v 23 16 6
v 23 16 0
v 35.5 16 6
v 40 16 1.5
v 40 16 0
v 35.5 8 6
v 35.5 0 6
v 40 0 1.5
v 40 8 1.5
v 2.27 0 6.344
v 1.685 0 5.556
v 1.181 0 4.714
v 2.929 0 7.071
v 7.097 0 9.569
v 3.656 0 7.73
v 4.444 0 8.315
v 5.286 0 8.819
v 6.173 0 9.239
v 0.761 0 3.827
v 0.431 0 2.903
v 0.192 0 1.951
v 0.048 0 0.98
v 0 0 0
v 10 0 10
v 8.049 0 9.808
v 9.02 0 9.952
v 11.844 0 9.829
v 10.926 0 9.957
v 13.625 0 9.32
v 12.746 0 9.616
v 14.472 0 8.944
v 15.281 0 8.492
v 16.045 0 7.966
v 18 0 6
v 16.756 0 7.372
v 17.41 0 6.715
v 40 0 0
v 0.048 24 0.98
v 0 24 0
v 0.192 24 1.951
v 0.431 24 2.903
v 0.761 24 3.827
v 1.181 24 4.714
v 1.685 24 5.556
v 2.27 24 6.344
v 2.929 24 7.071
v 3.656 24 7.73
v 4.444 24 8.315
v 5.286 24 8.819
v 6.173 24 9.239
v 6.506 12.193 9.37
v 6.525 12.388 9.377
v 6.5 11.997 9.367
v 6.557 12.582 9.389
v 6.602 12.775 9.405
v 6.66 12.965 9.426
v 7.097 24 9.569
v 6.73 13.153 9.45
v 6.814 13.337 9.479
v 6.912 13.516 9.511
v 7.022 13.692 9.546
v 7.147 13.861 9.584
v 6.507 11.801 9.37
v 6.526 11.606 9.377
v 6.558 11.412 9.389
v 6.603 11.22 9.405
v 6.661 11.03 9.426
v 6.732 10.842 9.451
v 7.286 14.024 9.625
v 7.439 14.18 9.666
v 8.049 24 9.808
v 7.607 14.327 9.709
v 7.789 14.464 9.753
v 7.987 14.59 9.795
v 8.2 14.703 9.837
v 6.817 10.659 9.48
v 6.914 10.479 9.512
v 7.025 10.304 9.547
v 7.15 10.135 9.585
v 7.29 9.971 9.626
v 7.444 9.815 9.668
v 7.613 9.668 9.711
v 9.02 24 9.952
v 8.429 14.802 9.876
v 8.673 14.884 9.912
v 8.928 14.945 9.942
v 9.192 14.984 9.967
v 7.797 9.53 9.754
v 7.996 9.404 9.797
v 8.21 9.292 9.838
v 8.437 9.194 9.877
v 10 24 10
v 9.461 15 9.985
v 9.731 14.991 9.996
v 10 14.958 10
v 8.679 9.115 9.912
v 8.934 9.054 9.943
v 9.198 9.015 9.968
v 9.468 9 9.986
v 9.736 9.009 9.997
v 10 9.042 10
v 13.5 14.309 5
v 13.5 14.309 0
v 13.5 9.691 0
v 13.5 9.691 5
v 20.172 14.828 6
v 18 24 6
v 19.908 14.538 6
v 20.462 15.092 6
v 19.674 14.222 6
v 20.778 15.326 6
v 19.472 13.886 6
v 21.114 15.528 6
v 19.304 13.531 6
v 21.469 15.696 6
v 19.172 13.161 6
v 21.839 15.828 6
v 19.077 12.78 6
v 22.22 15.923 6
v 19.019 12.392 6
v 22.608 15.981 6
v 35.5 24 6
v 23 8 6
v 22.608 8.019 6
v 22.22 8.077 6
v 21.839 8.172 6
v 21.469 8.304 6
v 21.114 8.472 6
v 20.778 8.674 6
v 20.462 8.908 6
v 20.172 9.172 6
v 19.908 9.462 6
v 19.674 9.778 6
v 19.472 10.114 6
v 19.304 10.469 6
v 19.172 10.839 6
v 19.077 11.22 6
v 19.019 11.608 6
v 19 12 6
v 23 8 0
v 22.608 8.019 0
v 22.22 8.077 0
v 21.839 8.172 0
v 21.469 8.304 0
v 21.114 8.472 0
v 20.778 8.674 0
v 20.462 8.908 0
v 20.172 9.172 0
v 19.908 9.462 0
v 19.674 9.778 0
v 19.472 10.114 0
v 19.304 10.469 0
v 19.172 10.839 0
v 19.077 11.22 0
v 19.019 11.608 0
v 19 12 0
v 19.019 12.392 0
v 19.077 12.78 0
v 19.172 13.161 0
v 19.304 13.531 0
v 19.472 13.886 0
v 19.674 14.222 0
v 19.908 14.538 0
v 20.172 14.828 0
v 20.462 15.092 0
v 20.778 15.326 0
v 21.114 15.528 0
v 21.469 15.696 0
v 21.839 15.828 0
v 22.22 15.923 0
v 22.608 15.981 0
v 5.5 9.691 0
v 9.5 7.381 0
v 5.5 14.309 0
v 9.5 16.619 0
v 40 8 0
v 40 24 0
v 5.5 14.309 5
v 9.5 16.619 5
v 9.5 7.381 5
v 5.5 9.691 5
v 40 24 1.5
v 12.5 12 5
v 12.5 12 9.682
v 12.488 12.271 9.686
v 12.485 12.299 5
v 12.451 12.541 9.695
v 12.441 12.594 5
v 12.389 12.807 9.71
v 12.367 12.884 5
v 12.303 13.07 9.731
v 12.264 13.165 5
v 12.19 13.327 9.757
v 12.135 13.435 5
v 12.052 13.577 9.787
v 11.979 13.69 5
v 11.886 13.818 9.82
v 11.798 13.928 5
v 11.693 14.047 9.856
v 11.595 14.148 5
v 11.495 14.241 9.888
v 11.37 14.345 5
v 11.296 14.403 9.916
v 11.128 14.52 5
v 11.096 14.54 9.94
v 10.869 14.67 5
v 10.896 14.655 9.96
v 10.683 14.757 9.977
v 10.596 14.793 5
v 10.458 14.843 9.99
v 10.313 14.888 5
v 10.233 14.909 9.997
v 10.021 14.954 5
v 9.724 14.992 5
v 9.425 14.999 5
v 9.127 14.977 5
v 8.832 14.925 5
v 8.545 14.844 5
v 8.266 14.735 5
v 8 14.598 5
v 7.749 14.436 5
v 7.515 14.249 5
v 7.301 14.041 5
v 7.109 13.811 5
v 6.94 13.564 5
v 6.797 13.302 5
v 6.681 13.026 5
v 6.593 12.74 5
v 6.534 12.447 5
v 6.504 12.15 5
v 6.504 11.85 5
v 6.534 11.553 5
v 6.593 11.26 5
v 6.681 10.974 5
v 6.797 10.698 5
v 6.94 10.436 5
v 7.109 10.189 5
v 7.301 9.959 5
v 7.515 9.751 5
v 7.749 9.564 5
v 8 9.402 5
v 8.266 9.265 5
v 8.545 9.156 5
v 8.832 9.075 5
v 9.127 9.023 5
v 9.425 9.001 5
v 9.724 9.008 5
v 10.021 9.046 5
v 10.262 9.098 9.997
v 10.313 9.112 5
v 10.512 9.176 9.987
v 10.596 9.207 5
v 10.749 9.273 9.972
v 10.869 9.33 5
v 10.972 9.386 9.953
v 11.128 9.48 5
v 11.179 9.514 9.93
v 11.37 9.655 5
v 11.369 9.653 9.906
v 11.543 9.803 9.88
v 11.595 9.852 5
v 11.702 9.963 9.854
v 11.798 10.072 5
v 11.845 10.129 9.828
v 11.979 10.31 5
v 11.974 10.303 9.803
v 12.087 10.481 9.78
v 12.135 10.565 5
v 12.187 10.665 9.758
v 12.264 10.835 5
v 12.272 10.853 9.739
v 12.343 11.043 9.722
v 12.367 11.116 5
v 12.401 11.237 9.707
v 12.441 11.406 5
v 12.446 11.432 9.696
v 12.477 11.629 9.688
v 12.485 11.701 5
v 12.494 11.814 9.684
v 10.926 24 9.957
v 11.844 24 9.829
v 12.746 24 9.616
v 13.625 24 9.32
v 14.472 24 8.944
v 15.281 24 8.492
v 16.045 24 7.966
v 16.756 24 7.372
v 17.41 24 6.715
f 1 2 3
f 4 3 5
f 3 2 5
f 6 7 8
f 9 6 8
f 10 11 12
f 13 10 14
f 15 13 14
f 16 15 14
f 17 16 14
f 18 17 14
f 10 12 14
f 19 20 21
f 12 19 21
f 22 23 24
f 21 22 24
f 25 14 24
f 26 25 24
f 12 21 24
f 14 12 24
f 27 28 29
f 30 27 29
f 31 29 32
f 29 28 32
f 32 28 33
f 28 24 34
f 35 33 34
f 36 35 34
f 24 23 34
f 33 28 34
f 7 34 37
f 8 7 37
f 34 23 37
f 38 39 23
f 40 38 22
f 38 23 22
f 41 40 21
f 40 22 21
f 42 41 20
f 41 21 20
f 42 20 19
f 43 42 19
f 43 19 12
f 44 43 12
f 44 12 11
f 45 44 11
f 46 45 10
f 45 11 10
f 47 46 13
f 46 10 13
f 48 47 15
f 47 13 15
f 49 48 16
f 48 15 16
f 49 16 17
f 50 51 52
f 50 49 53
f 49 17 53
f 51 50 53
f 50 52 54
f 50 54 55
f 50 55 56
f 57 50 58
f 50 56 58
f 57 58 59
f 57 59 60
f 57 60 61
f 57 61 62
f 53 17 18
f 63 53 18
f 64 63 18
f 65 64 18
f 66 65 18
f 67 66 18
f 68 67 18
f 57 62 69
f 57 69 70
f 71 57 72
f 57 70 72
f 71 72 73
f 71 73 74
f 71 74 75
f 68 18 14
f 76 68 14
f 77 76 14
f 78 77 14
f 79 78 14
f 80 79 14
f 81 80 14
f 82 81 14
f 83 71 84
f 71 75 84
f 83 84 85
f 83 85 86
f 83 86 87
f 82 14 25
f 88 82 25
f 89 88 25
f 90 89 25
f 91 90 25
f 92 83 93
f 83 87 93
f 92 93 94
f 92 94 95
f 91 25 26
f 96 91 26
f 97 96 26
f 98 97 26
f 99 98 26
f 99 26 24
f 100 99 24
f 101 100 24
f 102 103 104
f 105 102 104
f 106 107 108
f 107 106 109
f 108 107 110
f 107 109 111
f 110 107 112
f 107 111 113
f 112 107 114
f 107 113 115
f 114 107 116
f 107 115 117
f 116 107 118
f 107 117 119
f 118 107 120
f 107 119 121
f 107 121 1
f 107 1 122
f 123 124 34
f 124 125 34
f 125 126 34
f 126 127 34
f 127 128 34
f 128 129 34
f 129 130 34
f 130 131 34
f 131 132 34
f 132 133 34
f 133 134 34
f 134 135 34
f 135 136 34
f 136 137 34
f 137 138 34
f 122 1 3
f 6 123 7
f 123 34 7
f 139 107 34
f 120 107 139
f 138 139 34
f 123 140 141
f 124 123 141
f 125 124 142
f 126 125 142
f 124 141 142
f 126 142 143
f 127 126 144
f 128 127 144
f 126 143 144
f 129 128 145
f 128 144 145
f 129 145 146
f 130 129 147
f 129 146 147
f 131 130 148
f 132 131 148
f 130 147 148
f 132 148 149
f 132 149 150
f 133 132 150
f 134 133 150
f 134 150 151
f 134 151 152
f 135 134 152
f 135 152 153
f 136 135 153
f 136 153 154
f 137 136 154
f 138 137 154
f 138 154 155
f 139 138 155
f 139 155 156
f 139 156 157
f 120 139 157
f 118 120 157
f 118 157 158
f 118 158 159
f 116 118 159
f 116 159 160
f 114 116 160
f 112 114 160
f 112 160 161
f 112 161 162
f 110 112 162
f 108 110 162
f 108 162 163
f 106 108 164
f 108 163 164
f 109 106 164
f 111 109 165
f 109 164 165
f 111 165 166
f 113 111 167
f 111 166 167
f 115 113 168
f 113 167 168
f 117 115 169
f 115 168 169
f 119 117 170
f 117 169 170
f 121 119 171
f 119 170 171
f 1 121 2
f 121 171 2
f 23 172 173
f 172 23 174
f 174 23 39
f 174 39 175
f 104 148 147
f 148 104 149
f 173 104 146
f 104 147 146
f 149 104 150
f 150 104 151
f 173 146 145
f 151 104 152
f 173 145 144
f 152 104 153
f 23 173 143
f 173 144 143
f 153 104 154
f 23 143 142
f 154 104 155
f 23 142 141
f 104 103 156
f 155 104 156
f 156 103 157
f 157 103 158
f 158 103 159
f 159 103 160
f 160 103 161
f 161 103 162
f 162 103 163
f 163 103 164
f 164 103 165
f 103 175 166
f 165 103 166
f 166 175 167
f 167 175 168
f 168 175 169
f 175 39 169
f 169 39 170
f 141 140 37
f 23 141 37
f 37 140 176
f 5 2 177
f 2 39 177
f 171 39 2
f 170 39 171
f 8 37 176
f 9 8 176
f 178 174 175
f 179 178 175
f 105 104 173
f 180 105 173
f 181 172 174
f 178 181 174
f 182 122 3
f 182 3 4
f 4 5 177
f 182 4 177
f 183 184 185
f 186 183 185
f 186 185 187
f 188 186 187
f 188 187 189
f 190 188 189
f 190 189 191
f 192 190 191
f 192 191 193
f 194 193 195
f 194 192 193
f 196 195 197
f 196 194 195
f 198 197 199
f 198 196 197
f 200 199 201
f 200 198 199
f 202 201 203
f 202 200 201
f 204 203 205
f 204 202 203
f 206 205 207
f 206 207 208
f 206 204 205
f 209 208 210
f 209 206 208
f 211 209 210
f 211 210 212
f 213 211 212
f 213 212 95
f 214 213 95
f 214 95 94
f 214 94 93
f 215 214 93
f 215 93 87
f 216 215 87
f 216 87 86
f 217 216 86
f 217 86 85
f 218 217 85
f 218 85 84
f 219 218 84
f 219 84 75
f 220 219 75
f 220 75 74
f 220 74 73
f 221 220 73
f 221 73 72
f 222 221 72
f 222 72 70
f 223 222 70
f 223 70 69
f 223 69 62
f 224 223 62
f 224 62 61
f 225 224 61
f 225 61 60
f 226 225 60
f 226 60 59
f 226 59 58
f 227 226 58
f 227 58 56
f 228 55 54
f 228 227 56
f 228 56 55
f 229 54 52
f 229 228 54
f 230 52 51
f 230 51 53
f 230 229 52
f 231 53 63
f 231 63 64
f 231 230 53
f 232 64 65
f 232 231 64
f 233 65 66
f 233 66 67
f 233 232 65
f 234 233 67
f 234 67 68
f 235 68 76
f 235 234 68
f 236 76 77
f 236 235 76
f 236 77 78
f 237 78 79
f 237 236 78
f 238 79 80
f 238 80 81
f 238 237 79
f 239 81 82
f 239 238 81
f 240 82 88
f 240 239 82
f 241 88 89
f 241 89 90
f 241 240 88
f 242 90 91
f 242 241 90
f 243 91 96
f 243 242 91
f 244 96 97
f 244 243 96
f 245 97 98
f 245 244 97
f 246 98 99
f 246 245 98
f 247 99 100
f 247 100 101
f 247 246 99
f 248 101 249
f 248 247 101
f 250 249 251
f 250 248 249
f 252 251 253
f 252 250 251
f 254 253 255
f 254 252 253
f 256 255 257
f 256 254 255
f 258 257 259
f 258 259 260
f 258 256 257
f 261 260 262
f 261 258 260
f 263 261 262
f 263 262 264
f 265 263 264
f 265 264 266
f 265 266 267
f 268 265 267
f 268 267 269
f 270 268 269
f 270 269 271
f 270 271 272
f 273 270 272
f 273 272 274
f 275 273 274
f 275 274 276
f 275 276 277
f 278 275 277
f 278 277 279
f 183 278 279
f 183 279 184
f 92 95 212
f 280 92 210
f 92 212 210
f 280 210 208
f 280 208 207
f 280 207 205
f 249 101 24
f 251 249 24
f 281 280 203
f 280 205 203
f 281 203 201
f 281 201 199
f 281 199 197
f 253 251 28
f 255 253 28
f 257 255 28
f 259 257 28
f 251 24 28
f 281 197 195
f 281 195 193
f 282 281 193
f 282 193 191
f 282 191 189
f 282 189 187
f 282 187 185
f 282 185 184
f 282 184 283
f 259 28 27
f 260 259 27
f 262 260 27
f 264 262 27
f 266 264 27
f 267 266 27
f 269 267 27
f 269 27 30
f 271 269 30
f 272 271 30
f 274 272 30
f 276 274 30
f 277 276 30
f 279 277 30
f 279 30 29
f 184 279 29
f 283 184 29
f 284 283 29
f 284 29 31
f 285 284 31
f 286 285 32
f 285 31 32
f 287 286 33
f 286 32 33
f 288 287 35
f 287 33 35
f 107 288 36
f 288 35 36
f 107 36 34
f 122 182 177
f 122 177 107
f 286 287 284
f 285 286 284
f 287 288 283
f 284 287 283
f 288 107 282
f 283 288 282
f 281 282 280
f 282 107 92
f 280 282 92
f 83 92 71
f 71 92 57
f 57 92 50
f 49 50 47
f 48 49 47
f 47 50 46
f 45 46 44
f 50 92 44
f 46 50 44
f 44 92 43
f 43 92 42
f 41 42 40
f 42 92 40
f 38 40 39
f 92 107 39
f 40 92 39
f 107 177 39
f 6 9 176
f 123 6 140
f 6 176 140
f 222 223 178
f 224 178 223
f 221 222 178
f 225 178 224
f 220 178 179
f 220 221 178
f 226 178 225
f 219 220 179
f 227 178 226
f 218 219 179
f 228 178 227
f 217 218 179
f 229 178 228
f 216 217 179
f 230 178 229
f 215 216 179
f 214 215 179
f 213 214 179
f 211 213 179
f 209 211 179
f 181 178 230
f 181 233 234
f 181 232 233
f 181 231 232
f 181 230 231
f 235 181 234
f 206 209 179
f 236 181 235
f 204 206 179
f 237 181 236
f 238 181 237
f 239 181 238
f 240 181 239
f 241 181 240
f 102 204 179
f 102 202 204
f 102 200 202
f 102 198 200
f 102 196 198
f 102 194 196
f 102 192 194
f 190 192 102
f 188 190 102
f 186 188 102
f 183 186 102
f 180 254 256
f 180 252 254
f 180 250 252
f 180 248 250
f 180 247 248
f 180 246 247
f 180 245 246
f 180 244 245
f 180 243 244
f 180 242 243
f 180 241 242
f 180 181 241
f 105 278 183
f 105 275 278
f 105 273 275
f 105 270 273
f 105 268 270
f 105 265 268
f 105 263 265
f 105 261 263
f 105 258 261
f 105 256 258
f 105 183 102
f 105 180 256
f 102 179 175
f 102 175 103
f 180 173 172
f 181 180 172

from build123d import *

# Parameters (mm, degrees)
F0_R     = 3
F1_DEPTH = 10
F2_R     = 3
F3_DEPTH = 5
F5_DEPTH = 24.001


with BuildPart() as f1:
    # F0 (on Top) → F1 (new body)
    with BuildSketch(Plane.XY):
        with BuildLine():
            Line((0, 24), (0, 0))
            Line((0, 0), (40, 0))
            Line((40, 0), (40, 8))
            Line((40, 8), (23, 8))
            ThreePointArc((23, 8), (19, 12), (23, 16))
            Line((23, 16), (40, 16))
            Line((40, 16), (40, 24))
            Line((40, 24), (0, 24))
        make_face()
        with Locations((9.5, 12)):
            Circle(F0_R, mode=Mode.SUBTRACT)
    extrude(amount=F1_DEPTH)

    # F2 (on face) → F3 (cut)
    with BuildSketch(Plane(origin=(0, 0, 0), x_dir=(1, 0, 0), z_dir=(0, 0, -1))):
        Polygon((9.5, -16.618802), (13.5, -14.309401), (13.5, -9.690599), (9.5, -7.381198), (5.5, -9.690599), (5.5, -14.309401), align=None)
        with Locations((9.5, -12)):
            Circle(F2_R, mode=Mode.SUBTRACT)
    extrude(amount=-F3_DEPTH, mode=Mode.SUBTRACT)

    # F4 (on face) → F5 (cut, through all)
    with BuildSketch(Plane.XZ):
        with BuildLine():
            Line((0, 10), (0, 0))
            ThreePointArc((0, 0), (2.928932, 7.071068), (10, 10))
            Line((10, 10), (0, 10))
        make_face()
        with BuildLine():
            Line((35.5, 6), (40, 1.5))
            Line((40, 1.5), (40, 10))
            Line((40, 10), (10, 10))
            ThreePointArc((10, 10), (14.472136, 8.944272), (18, 6))
            Line((18, 6), (35.5, 6))
        make_face()
    extrude(amount=-F5_DEPTH, mode=Mode.SUBTRACT)


solid = f1.part
